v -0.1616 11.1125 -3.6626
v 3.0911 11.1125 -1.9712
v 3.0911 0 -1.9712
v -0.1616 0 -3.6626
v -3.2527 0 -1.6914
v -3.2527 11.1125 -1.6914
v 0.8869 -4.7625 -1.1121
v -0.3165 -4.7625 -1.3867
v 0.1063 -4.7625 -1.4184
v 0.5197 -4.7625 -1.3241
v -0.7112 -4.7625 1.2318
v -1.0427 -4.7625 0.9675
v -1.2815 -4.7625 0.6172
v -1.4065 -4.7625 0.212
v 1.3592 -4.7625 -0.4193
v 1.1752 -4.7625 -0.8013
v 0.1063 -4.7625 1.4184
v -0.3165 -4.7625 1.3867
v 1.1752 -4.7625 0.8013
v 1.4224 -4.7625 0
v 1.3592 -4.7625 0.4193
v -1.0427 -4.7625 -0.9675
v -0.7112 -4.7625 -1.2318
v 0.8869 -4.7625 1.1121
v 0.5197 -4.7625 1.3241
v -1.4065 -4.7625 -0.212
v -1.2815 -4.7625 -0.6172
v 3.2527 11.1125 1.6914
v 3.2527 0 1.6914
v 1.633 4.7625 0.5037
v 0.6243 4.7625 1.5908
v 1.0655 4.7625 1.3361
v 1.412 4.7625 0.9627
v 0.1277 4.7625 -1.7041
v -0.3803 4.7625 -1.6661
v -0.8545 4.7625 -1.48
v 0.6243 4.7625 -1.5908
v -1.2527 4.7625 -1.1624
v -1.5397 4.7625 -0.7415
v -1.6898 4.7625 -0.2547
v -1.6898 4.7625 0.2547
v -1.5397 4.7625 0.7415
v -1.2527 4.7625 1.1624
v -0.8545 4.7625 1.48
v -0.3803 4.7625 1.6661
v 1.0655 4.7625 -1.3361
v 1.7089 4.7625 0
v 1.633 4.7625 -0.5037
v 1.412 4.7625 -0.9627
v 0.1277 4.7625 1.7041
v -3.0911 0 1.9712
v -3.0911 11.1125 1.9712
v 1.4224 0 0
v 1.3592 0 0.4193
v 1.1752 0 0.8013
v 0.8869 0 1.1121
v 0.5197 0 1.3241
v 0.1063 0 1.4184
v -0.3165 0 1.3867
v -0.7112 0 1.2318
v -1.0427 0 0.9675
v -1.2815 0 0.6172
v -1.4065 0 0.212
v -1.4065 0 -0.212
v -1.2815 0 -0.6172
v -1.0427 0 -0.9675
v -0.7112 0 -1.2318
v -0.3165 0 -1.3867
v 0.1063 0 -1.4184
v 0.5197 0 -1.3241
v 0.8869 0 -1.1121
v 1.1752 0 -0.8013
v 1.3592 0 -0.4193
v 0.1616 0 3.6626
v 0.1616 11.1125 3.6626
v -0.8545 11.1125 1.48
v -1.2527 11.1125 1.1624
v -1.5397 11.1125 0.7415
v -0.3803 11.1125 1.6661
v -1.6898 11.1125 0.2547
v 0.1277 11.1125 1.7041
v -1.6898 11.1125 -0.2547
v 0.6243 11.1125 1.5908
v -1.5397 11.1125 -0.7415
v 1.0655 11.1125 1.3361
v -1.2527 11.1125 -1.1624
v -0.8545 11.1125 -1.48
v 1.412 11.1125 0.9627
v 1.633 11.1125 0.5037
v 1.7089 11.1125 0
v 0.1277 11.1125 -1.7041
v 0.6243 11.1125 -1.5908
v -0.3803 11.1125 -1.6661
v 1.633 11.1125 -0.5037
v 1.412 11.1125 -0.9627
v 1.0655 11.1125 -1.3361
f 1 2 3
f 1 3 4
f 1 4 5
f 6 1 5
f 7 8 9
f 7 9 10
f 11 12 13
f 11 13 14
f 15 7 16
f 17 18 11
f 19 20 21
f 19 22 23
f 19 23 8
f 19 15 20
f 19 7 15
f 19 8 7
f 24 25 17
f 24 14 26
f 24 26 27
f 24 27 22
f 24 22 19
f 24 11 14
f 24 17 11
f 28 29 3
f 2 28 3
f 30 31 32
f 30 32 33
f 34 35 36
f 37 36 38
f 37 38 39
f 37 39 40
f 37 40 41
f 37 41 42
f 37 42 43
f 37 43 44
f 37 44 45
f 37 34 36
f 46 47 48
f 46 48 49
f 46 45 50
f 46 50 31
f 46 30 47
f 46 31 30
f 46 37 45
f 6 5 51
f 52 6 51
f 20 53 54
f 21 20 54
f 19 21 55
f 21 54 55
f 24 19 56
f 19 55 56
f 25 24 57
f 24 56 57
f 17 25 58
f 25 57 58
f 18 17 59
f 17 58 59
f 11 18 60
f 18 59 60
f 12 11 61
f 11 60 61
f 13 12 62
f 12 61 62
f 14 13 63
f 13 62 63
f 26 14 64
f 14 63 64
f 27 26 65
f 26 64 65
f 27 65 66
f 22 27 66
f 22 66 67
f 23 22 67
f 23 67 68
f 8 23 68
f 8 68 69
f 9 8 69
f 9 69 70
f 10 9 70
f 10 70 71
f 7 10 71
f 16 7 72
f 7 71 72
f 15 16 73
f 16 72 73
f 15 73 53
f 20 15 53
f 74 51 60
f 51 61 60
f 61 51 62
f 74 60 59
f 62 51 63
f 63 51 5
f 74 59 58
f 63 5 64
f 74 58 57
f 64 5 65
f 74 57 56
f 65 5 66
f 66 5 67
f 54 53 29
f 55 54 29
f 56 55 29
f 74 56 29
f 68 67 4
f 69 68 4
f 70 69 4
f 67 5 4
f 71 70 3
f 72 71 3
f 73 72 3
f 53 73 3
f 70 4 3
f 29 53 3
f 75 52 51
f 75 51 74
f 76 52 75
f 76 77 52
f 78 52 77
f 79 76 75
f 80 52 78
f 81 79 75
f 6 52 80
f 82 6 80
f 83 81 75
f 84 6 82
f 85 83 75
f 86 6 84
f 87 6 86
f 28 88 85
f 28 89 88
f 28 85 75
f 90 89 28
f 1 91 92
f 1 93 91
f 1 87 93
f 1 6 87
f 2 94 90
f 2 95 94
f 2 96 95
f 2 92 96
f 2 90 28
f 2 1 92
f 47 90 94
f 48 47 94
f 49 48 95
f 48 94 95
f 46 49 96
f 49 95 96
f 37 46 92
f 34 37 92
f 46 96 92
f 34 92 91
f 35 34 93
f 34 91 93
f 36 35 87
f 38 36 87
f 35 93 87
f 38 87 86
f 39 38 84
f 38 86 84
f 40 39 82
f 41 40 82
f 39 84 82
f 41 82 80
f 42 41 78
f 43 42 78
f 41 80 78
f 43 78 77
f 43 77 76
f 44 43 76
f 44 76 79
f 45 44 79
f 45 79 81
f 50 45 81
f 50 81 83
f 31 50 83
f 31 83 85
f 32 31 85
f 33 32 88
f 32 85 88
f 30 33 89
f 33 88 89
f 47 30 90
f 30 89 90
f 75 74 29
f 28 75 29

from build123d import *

# Parameters (mm, degrees)
BOSS_EXTRUDE1_DEPTH = 11.1125
SKETCH2_R           = 1.4224
BOSS_EXTRUDE2_DEPTH = 4.7625
SKETCH3_R           = 1.70891155
CUT_EXTRUDE1_DEPTH  = 6.35


with BuildPart() as part:
    # Sketch1 → Boss-Extrude1 (new body)
    with BuildSketch(Plane(origin=(0, 0, 0), x_dir=(1, 0, 0), z_dir=(0, 1, 0))):
        Polygon((3.252691355, -1.691399504), (3.091140616, 1.971213592), (-0.161550739, 3.662613096), (-3.252691355, 1.691399504), (-3.091140616, -1.971213592), (0.161550739, -3.662613096), align=None)
    extrude(amount=BOSS_EXTRUDE1_DEPTH)

    # Sketch2 → Boss-Extrude2 (add)
    with BuildSketch(Plane.XZ):
        Circle(SKETCH2_R)
    extrude(amount=BOSS_EXTRUDE2_DEPTH)

    # Sketch3 → Cut-Extrude1 (cut)
    with BuildSketch(Plane(origin=(0, 11.1125, 0), x_dir=(1, 0, 0), z_dir=(0, 1, 0))):
        Circle(SKETCH3_R)
    extrude(amount=-CUT_EXTRUDE1_DEPTH, mode=Mode.SUBTRACT)


solid = part.part
